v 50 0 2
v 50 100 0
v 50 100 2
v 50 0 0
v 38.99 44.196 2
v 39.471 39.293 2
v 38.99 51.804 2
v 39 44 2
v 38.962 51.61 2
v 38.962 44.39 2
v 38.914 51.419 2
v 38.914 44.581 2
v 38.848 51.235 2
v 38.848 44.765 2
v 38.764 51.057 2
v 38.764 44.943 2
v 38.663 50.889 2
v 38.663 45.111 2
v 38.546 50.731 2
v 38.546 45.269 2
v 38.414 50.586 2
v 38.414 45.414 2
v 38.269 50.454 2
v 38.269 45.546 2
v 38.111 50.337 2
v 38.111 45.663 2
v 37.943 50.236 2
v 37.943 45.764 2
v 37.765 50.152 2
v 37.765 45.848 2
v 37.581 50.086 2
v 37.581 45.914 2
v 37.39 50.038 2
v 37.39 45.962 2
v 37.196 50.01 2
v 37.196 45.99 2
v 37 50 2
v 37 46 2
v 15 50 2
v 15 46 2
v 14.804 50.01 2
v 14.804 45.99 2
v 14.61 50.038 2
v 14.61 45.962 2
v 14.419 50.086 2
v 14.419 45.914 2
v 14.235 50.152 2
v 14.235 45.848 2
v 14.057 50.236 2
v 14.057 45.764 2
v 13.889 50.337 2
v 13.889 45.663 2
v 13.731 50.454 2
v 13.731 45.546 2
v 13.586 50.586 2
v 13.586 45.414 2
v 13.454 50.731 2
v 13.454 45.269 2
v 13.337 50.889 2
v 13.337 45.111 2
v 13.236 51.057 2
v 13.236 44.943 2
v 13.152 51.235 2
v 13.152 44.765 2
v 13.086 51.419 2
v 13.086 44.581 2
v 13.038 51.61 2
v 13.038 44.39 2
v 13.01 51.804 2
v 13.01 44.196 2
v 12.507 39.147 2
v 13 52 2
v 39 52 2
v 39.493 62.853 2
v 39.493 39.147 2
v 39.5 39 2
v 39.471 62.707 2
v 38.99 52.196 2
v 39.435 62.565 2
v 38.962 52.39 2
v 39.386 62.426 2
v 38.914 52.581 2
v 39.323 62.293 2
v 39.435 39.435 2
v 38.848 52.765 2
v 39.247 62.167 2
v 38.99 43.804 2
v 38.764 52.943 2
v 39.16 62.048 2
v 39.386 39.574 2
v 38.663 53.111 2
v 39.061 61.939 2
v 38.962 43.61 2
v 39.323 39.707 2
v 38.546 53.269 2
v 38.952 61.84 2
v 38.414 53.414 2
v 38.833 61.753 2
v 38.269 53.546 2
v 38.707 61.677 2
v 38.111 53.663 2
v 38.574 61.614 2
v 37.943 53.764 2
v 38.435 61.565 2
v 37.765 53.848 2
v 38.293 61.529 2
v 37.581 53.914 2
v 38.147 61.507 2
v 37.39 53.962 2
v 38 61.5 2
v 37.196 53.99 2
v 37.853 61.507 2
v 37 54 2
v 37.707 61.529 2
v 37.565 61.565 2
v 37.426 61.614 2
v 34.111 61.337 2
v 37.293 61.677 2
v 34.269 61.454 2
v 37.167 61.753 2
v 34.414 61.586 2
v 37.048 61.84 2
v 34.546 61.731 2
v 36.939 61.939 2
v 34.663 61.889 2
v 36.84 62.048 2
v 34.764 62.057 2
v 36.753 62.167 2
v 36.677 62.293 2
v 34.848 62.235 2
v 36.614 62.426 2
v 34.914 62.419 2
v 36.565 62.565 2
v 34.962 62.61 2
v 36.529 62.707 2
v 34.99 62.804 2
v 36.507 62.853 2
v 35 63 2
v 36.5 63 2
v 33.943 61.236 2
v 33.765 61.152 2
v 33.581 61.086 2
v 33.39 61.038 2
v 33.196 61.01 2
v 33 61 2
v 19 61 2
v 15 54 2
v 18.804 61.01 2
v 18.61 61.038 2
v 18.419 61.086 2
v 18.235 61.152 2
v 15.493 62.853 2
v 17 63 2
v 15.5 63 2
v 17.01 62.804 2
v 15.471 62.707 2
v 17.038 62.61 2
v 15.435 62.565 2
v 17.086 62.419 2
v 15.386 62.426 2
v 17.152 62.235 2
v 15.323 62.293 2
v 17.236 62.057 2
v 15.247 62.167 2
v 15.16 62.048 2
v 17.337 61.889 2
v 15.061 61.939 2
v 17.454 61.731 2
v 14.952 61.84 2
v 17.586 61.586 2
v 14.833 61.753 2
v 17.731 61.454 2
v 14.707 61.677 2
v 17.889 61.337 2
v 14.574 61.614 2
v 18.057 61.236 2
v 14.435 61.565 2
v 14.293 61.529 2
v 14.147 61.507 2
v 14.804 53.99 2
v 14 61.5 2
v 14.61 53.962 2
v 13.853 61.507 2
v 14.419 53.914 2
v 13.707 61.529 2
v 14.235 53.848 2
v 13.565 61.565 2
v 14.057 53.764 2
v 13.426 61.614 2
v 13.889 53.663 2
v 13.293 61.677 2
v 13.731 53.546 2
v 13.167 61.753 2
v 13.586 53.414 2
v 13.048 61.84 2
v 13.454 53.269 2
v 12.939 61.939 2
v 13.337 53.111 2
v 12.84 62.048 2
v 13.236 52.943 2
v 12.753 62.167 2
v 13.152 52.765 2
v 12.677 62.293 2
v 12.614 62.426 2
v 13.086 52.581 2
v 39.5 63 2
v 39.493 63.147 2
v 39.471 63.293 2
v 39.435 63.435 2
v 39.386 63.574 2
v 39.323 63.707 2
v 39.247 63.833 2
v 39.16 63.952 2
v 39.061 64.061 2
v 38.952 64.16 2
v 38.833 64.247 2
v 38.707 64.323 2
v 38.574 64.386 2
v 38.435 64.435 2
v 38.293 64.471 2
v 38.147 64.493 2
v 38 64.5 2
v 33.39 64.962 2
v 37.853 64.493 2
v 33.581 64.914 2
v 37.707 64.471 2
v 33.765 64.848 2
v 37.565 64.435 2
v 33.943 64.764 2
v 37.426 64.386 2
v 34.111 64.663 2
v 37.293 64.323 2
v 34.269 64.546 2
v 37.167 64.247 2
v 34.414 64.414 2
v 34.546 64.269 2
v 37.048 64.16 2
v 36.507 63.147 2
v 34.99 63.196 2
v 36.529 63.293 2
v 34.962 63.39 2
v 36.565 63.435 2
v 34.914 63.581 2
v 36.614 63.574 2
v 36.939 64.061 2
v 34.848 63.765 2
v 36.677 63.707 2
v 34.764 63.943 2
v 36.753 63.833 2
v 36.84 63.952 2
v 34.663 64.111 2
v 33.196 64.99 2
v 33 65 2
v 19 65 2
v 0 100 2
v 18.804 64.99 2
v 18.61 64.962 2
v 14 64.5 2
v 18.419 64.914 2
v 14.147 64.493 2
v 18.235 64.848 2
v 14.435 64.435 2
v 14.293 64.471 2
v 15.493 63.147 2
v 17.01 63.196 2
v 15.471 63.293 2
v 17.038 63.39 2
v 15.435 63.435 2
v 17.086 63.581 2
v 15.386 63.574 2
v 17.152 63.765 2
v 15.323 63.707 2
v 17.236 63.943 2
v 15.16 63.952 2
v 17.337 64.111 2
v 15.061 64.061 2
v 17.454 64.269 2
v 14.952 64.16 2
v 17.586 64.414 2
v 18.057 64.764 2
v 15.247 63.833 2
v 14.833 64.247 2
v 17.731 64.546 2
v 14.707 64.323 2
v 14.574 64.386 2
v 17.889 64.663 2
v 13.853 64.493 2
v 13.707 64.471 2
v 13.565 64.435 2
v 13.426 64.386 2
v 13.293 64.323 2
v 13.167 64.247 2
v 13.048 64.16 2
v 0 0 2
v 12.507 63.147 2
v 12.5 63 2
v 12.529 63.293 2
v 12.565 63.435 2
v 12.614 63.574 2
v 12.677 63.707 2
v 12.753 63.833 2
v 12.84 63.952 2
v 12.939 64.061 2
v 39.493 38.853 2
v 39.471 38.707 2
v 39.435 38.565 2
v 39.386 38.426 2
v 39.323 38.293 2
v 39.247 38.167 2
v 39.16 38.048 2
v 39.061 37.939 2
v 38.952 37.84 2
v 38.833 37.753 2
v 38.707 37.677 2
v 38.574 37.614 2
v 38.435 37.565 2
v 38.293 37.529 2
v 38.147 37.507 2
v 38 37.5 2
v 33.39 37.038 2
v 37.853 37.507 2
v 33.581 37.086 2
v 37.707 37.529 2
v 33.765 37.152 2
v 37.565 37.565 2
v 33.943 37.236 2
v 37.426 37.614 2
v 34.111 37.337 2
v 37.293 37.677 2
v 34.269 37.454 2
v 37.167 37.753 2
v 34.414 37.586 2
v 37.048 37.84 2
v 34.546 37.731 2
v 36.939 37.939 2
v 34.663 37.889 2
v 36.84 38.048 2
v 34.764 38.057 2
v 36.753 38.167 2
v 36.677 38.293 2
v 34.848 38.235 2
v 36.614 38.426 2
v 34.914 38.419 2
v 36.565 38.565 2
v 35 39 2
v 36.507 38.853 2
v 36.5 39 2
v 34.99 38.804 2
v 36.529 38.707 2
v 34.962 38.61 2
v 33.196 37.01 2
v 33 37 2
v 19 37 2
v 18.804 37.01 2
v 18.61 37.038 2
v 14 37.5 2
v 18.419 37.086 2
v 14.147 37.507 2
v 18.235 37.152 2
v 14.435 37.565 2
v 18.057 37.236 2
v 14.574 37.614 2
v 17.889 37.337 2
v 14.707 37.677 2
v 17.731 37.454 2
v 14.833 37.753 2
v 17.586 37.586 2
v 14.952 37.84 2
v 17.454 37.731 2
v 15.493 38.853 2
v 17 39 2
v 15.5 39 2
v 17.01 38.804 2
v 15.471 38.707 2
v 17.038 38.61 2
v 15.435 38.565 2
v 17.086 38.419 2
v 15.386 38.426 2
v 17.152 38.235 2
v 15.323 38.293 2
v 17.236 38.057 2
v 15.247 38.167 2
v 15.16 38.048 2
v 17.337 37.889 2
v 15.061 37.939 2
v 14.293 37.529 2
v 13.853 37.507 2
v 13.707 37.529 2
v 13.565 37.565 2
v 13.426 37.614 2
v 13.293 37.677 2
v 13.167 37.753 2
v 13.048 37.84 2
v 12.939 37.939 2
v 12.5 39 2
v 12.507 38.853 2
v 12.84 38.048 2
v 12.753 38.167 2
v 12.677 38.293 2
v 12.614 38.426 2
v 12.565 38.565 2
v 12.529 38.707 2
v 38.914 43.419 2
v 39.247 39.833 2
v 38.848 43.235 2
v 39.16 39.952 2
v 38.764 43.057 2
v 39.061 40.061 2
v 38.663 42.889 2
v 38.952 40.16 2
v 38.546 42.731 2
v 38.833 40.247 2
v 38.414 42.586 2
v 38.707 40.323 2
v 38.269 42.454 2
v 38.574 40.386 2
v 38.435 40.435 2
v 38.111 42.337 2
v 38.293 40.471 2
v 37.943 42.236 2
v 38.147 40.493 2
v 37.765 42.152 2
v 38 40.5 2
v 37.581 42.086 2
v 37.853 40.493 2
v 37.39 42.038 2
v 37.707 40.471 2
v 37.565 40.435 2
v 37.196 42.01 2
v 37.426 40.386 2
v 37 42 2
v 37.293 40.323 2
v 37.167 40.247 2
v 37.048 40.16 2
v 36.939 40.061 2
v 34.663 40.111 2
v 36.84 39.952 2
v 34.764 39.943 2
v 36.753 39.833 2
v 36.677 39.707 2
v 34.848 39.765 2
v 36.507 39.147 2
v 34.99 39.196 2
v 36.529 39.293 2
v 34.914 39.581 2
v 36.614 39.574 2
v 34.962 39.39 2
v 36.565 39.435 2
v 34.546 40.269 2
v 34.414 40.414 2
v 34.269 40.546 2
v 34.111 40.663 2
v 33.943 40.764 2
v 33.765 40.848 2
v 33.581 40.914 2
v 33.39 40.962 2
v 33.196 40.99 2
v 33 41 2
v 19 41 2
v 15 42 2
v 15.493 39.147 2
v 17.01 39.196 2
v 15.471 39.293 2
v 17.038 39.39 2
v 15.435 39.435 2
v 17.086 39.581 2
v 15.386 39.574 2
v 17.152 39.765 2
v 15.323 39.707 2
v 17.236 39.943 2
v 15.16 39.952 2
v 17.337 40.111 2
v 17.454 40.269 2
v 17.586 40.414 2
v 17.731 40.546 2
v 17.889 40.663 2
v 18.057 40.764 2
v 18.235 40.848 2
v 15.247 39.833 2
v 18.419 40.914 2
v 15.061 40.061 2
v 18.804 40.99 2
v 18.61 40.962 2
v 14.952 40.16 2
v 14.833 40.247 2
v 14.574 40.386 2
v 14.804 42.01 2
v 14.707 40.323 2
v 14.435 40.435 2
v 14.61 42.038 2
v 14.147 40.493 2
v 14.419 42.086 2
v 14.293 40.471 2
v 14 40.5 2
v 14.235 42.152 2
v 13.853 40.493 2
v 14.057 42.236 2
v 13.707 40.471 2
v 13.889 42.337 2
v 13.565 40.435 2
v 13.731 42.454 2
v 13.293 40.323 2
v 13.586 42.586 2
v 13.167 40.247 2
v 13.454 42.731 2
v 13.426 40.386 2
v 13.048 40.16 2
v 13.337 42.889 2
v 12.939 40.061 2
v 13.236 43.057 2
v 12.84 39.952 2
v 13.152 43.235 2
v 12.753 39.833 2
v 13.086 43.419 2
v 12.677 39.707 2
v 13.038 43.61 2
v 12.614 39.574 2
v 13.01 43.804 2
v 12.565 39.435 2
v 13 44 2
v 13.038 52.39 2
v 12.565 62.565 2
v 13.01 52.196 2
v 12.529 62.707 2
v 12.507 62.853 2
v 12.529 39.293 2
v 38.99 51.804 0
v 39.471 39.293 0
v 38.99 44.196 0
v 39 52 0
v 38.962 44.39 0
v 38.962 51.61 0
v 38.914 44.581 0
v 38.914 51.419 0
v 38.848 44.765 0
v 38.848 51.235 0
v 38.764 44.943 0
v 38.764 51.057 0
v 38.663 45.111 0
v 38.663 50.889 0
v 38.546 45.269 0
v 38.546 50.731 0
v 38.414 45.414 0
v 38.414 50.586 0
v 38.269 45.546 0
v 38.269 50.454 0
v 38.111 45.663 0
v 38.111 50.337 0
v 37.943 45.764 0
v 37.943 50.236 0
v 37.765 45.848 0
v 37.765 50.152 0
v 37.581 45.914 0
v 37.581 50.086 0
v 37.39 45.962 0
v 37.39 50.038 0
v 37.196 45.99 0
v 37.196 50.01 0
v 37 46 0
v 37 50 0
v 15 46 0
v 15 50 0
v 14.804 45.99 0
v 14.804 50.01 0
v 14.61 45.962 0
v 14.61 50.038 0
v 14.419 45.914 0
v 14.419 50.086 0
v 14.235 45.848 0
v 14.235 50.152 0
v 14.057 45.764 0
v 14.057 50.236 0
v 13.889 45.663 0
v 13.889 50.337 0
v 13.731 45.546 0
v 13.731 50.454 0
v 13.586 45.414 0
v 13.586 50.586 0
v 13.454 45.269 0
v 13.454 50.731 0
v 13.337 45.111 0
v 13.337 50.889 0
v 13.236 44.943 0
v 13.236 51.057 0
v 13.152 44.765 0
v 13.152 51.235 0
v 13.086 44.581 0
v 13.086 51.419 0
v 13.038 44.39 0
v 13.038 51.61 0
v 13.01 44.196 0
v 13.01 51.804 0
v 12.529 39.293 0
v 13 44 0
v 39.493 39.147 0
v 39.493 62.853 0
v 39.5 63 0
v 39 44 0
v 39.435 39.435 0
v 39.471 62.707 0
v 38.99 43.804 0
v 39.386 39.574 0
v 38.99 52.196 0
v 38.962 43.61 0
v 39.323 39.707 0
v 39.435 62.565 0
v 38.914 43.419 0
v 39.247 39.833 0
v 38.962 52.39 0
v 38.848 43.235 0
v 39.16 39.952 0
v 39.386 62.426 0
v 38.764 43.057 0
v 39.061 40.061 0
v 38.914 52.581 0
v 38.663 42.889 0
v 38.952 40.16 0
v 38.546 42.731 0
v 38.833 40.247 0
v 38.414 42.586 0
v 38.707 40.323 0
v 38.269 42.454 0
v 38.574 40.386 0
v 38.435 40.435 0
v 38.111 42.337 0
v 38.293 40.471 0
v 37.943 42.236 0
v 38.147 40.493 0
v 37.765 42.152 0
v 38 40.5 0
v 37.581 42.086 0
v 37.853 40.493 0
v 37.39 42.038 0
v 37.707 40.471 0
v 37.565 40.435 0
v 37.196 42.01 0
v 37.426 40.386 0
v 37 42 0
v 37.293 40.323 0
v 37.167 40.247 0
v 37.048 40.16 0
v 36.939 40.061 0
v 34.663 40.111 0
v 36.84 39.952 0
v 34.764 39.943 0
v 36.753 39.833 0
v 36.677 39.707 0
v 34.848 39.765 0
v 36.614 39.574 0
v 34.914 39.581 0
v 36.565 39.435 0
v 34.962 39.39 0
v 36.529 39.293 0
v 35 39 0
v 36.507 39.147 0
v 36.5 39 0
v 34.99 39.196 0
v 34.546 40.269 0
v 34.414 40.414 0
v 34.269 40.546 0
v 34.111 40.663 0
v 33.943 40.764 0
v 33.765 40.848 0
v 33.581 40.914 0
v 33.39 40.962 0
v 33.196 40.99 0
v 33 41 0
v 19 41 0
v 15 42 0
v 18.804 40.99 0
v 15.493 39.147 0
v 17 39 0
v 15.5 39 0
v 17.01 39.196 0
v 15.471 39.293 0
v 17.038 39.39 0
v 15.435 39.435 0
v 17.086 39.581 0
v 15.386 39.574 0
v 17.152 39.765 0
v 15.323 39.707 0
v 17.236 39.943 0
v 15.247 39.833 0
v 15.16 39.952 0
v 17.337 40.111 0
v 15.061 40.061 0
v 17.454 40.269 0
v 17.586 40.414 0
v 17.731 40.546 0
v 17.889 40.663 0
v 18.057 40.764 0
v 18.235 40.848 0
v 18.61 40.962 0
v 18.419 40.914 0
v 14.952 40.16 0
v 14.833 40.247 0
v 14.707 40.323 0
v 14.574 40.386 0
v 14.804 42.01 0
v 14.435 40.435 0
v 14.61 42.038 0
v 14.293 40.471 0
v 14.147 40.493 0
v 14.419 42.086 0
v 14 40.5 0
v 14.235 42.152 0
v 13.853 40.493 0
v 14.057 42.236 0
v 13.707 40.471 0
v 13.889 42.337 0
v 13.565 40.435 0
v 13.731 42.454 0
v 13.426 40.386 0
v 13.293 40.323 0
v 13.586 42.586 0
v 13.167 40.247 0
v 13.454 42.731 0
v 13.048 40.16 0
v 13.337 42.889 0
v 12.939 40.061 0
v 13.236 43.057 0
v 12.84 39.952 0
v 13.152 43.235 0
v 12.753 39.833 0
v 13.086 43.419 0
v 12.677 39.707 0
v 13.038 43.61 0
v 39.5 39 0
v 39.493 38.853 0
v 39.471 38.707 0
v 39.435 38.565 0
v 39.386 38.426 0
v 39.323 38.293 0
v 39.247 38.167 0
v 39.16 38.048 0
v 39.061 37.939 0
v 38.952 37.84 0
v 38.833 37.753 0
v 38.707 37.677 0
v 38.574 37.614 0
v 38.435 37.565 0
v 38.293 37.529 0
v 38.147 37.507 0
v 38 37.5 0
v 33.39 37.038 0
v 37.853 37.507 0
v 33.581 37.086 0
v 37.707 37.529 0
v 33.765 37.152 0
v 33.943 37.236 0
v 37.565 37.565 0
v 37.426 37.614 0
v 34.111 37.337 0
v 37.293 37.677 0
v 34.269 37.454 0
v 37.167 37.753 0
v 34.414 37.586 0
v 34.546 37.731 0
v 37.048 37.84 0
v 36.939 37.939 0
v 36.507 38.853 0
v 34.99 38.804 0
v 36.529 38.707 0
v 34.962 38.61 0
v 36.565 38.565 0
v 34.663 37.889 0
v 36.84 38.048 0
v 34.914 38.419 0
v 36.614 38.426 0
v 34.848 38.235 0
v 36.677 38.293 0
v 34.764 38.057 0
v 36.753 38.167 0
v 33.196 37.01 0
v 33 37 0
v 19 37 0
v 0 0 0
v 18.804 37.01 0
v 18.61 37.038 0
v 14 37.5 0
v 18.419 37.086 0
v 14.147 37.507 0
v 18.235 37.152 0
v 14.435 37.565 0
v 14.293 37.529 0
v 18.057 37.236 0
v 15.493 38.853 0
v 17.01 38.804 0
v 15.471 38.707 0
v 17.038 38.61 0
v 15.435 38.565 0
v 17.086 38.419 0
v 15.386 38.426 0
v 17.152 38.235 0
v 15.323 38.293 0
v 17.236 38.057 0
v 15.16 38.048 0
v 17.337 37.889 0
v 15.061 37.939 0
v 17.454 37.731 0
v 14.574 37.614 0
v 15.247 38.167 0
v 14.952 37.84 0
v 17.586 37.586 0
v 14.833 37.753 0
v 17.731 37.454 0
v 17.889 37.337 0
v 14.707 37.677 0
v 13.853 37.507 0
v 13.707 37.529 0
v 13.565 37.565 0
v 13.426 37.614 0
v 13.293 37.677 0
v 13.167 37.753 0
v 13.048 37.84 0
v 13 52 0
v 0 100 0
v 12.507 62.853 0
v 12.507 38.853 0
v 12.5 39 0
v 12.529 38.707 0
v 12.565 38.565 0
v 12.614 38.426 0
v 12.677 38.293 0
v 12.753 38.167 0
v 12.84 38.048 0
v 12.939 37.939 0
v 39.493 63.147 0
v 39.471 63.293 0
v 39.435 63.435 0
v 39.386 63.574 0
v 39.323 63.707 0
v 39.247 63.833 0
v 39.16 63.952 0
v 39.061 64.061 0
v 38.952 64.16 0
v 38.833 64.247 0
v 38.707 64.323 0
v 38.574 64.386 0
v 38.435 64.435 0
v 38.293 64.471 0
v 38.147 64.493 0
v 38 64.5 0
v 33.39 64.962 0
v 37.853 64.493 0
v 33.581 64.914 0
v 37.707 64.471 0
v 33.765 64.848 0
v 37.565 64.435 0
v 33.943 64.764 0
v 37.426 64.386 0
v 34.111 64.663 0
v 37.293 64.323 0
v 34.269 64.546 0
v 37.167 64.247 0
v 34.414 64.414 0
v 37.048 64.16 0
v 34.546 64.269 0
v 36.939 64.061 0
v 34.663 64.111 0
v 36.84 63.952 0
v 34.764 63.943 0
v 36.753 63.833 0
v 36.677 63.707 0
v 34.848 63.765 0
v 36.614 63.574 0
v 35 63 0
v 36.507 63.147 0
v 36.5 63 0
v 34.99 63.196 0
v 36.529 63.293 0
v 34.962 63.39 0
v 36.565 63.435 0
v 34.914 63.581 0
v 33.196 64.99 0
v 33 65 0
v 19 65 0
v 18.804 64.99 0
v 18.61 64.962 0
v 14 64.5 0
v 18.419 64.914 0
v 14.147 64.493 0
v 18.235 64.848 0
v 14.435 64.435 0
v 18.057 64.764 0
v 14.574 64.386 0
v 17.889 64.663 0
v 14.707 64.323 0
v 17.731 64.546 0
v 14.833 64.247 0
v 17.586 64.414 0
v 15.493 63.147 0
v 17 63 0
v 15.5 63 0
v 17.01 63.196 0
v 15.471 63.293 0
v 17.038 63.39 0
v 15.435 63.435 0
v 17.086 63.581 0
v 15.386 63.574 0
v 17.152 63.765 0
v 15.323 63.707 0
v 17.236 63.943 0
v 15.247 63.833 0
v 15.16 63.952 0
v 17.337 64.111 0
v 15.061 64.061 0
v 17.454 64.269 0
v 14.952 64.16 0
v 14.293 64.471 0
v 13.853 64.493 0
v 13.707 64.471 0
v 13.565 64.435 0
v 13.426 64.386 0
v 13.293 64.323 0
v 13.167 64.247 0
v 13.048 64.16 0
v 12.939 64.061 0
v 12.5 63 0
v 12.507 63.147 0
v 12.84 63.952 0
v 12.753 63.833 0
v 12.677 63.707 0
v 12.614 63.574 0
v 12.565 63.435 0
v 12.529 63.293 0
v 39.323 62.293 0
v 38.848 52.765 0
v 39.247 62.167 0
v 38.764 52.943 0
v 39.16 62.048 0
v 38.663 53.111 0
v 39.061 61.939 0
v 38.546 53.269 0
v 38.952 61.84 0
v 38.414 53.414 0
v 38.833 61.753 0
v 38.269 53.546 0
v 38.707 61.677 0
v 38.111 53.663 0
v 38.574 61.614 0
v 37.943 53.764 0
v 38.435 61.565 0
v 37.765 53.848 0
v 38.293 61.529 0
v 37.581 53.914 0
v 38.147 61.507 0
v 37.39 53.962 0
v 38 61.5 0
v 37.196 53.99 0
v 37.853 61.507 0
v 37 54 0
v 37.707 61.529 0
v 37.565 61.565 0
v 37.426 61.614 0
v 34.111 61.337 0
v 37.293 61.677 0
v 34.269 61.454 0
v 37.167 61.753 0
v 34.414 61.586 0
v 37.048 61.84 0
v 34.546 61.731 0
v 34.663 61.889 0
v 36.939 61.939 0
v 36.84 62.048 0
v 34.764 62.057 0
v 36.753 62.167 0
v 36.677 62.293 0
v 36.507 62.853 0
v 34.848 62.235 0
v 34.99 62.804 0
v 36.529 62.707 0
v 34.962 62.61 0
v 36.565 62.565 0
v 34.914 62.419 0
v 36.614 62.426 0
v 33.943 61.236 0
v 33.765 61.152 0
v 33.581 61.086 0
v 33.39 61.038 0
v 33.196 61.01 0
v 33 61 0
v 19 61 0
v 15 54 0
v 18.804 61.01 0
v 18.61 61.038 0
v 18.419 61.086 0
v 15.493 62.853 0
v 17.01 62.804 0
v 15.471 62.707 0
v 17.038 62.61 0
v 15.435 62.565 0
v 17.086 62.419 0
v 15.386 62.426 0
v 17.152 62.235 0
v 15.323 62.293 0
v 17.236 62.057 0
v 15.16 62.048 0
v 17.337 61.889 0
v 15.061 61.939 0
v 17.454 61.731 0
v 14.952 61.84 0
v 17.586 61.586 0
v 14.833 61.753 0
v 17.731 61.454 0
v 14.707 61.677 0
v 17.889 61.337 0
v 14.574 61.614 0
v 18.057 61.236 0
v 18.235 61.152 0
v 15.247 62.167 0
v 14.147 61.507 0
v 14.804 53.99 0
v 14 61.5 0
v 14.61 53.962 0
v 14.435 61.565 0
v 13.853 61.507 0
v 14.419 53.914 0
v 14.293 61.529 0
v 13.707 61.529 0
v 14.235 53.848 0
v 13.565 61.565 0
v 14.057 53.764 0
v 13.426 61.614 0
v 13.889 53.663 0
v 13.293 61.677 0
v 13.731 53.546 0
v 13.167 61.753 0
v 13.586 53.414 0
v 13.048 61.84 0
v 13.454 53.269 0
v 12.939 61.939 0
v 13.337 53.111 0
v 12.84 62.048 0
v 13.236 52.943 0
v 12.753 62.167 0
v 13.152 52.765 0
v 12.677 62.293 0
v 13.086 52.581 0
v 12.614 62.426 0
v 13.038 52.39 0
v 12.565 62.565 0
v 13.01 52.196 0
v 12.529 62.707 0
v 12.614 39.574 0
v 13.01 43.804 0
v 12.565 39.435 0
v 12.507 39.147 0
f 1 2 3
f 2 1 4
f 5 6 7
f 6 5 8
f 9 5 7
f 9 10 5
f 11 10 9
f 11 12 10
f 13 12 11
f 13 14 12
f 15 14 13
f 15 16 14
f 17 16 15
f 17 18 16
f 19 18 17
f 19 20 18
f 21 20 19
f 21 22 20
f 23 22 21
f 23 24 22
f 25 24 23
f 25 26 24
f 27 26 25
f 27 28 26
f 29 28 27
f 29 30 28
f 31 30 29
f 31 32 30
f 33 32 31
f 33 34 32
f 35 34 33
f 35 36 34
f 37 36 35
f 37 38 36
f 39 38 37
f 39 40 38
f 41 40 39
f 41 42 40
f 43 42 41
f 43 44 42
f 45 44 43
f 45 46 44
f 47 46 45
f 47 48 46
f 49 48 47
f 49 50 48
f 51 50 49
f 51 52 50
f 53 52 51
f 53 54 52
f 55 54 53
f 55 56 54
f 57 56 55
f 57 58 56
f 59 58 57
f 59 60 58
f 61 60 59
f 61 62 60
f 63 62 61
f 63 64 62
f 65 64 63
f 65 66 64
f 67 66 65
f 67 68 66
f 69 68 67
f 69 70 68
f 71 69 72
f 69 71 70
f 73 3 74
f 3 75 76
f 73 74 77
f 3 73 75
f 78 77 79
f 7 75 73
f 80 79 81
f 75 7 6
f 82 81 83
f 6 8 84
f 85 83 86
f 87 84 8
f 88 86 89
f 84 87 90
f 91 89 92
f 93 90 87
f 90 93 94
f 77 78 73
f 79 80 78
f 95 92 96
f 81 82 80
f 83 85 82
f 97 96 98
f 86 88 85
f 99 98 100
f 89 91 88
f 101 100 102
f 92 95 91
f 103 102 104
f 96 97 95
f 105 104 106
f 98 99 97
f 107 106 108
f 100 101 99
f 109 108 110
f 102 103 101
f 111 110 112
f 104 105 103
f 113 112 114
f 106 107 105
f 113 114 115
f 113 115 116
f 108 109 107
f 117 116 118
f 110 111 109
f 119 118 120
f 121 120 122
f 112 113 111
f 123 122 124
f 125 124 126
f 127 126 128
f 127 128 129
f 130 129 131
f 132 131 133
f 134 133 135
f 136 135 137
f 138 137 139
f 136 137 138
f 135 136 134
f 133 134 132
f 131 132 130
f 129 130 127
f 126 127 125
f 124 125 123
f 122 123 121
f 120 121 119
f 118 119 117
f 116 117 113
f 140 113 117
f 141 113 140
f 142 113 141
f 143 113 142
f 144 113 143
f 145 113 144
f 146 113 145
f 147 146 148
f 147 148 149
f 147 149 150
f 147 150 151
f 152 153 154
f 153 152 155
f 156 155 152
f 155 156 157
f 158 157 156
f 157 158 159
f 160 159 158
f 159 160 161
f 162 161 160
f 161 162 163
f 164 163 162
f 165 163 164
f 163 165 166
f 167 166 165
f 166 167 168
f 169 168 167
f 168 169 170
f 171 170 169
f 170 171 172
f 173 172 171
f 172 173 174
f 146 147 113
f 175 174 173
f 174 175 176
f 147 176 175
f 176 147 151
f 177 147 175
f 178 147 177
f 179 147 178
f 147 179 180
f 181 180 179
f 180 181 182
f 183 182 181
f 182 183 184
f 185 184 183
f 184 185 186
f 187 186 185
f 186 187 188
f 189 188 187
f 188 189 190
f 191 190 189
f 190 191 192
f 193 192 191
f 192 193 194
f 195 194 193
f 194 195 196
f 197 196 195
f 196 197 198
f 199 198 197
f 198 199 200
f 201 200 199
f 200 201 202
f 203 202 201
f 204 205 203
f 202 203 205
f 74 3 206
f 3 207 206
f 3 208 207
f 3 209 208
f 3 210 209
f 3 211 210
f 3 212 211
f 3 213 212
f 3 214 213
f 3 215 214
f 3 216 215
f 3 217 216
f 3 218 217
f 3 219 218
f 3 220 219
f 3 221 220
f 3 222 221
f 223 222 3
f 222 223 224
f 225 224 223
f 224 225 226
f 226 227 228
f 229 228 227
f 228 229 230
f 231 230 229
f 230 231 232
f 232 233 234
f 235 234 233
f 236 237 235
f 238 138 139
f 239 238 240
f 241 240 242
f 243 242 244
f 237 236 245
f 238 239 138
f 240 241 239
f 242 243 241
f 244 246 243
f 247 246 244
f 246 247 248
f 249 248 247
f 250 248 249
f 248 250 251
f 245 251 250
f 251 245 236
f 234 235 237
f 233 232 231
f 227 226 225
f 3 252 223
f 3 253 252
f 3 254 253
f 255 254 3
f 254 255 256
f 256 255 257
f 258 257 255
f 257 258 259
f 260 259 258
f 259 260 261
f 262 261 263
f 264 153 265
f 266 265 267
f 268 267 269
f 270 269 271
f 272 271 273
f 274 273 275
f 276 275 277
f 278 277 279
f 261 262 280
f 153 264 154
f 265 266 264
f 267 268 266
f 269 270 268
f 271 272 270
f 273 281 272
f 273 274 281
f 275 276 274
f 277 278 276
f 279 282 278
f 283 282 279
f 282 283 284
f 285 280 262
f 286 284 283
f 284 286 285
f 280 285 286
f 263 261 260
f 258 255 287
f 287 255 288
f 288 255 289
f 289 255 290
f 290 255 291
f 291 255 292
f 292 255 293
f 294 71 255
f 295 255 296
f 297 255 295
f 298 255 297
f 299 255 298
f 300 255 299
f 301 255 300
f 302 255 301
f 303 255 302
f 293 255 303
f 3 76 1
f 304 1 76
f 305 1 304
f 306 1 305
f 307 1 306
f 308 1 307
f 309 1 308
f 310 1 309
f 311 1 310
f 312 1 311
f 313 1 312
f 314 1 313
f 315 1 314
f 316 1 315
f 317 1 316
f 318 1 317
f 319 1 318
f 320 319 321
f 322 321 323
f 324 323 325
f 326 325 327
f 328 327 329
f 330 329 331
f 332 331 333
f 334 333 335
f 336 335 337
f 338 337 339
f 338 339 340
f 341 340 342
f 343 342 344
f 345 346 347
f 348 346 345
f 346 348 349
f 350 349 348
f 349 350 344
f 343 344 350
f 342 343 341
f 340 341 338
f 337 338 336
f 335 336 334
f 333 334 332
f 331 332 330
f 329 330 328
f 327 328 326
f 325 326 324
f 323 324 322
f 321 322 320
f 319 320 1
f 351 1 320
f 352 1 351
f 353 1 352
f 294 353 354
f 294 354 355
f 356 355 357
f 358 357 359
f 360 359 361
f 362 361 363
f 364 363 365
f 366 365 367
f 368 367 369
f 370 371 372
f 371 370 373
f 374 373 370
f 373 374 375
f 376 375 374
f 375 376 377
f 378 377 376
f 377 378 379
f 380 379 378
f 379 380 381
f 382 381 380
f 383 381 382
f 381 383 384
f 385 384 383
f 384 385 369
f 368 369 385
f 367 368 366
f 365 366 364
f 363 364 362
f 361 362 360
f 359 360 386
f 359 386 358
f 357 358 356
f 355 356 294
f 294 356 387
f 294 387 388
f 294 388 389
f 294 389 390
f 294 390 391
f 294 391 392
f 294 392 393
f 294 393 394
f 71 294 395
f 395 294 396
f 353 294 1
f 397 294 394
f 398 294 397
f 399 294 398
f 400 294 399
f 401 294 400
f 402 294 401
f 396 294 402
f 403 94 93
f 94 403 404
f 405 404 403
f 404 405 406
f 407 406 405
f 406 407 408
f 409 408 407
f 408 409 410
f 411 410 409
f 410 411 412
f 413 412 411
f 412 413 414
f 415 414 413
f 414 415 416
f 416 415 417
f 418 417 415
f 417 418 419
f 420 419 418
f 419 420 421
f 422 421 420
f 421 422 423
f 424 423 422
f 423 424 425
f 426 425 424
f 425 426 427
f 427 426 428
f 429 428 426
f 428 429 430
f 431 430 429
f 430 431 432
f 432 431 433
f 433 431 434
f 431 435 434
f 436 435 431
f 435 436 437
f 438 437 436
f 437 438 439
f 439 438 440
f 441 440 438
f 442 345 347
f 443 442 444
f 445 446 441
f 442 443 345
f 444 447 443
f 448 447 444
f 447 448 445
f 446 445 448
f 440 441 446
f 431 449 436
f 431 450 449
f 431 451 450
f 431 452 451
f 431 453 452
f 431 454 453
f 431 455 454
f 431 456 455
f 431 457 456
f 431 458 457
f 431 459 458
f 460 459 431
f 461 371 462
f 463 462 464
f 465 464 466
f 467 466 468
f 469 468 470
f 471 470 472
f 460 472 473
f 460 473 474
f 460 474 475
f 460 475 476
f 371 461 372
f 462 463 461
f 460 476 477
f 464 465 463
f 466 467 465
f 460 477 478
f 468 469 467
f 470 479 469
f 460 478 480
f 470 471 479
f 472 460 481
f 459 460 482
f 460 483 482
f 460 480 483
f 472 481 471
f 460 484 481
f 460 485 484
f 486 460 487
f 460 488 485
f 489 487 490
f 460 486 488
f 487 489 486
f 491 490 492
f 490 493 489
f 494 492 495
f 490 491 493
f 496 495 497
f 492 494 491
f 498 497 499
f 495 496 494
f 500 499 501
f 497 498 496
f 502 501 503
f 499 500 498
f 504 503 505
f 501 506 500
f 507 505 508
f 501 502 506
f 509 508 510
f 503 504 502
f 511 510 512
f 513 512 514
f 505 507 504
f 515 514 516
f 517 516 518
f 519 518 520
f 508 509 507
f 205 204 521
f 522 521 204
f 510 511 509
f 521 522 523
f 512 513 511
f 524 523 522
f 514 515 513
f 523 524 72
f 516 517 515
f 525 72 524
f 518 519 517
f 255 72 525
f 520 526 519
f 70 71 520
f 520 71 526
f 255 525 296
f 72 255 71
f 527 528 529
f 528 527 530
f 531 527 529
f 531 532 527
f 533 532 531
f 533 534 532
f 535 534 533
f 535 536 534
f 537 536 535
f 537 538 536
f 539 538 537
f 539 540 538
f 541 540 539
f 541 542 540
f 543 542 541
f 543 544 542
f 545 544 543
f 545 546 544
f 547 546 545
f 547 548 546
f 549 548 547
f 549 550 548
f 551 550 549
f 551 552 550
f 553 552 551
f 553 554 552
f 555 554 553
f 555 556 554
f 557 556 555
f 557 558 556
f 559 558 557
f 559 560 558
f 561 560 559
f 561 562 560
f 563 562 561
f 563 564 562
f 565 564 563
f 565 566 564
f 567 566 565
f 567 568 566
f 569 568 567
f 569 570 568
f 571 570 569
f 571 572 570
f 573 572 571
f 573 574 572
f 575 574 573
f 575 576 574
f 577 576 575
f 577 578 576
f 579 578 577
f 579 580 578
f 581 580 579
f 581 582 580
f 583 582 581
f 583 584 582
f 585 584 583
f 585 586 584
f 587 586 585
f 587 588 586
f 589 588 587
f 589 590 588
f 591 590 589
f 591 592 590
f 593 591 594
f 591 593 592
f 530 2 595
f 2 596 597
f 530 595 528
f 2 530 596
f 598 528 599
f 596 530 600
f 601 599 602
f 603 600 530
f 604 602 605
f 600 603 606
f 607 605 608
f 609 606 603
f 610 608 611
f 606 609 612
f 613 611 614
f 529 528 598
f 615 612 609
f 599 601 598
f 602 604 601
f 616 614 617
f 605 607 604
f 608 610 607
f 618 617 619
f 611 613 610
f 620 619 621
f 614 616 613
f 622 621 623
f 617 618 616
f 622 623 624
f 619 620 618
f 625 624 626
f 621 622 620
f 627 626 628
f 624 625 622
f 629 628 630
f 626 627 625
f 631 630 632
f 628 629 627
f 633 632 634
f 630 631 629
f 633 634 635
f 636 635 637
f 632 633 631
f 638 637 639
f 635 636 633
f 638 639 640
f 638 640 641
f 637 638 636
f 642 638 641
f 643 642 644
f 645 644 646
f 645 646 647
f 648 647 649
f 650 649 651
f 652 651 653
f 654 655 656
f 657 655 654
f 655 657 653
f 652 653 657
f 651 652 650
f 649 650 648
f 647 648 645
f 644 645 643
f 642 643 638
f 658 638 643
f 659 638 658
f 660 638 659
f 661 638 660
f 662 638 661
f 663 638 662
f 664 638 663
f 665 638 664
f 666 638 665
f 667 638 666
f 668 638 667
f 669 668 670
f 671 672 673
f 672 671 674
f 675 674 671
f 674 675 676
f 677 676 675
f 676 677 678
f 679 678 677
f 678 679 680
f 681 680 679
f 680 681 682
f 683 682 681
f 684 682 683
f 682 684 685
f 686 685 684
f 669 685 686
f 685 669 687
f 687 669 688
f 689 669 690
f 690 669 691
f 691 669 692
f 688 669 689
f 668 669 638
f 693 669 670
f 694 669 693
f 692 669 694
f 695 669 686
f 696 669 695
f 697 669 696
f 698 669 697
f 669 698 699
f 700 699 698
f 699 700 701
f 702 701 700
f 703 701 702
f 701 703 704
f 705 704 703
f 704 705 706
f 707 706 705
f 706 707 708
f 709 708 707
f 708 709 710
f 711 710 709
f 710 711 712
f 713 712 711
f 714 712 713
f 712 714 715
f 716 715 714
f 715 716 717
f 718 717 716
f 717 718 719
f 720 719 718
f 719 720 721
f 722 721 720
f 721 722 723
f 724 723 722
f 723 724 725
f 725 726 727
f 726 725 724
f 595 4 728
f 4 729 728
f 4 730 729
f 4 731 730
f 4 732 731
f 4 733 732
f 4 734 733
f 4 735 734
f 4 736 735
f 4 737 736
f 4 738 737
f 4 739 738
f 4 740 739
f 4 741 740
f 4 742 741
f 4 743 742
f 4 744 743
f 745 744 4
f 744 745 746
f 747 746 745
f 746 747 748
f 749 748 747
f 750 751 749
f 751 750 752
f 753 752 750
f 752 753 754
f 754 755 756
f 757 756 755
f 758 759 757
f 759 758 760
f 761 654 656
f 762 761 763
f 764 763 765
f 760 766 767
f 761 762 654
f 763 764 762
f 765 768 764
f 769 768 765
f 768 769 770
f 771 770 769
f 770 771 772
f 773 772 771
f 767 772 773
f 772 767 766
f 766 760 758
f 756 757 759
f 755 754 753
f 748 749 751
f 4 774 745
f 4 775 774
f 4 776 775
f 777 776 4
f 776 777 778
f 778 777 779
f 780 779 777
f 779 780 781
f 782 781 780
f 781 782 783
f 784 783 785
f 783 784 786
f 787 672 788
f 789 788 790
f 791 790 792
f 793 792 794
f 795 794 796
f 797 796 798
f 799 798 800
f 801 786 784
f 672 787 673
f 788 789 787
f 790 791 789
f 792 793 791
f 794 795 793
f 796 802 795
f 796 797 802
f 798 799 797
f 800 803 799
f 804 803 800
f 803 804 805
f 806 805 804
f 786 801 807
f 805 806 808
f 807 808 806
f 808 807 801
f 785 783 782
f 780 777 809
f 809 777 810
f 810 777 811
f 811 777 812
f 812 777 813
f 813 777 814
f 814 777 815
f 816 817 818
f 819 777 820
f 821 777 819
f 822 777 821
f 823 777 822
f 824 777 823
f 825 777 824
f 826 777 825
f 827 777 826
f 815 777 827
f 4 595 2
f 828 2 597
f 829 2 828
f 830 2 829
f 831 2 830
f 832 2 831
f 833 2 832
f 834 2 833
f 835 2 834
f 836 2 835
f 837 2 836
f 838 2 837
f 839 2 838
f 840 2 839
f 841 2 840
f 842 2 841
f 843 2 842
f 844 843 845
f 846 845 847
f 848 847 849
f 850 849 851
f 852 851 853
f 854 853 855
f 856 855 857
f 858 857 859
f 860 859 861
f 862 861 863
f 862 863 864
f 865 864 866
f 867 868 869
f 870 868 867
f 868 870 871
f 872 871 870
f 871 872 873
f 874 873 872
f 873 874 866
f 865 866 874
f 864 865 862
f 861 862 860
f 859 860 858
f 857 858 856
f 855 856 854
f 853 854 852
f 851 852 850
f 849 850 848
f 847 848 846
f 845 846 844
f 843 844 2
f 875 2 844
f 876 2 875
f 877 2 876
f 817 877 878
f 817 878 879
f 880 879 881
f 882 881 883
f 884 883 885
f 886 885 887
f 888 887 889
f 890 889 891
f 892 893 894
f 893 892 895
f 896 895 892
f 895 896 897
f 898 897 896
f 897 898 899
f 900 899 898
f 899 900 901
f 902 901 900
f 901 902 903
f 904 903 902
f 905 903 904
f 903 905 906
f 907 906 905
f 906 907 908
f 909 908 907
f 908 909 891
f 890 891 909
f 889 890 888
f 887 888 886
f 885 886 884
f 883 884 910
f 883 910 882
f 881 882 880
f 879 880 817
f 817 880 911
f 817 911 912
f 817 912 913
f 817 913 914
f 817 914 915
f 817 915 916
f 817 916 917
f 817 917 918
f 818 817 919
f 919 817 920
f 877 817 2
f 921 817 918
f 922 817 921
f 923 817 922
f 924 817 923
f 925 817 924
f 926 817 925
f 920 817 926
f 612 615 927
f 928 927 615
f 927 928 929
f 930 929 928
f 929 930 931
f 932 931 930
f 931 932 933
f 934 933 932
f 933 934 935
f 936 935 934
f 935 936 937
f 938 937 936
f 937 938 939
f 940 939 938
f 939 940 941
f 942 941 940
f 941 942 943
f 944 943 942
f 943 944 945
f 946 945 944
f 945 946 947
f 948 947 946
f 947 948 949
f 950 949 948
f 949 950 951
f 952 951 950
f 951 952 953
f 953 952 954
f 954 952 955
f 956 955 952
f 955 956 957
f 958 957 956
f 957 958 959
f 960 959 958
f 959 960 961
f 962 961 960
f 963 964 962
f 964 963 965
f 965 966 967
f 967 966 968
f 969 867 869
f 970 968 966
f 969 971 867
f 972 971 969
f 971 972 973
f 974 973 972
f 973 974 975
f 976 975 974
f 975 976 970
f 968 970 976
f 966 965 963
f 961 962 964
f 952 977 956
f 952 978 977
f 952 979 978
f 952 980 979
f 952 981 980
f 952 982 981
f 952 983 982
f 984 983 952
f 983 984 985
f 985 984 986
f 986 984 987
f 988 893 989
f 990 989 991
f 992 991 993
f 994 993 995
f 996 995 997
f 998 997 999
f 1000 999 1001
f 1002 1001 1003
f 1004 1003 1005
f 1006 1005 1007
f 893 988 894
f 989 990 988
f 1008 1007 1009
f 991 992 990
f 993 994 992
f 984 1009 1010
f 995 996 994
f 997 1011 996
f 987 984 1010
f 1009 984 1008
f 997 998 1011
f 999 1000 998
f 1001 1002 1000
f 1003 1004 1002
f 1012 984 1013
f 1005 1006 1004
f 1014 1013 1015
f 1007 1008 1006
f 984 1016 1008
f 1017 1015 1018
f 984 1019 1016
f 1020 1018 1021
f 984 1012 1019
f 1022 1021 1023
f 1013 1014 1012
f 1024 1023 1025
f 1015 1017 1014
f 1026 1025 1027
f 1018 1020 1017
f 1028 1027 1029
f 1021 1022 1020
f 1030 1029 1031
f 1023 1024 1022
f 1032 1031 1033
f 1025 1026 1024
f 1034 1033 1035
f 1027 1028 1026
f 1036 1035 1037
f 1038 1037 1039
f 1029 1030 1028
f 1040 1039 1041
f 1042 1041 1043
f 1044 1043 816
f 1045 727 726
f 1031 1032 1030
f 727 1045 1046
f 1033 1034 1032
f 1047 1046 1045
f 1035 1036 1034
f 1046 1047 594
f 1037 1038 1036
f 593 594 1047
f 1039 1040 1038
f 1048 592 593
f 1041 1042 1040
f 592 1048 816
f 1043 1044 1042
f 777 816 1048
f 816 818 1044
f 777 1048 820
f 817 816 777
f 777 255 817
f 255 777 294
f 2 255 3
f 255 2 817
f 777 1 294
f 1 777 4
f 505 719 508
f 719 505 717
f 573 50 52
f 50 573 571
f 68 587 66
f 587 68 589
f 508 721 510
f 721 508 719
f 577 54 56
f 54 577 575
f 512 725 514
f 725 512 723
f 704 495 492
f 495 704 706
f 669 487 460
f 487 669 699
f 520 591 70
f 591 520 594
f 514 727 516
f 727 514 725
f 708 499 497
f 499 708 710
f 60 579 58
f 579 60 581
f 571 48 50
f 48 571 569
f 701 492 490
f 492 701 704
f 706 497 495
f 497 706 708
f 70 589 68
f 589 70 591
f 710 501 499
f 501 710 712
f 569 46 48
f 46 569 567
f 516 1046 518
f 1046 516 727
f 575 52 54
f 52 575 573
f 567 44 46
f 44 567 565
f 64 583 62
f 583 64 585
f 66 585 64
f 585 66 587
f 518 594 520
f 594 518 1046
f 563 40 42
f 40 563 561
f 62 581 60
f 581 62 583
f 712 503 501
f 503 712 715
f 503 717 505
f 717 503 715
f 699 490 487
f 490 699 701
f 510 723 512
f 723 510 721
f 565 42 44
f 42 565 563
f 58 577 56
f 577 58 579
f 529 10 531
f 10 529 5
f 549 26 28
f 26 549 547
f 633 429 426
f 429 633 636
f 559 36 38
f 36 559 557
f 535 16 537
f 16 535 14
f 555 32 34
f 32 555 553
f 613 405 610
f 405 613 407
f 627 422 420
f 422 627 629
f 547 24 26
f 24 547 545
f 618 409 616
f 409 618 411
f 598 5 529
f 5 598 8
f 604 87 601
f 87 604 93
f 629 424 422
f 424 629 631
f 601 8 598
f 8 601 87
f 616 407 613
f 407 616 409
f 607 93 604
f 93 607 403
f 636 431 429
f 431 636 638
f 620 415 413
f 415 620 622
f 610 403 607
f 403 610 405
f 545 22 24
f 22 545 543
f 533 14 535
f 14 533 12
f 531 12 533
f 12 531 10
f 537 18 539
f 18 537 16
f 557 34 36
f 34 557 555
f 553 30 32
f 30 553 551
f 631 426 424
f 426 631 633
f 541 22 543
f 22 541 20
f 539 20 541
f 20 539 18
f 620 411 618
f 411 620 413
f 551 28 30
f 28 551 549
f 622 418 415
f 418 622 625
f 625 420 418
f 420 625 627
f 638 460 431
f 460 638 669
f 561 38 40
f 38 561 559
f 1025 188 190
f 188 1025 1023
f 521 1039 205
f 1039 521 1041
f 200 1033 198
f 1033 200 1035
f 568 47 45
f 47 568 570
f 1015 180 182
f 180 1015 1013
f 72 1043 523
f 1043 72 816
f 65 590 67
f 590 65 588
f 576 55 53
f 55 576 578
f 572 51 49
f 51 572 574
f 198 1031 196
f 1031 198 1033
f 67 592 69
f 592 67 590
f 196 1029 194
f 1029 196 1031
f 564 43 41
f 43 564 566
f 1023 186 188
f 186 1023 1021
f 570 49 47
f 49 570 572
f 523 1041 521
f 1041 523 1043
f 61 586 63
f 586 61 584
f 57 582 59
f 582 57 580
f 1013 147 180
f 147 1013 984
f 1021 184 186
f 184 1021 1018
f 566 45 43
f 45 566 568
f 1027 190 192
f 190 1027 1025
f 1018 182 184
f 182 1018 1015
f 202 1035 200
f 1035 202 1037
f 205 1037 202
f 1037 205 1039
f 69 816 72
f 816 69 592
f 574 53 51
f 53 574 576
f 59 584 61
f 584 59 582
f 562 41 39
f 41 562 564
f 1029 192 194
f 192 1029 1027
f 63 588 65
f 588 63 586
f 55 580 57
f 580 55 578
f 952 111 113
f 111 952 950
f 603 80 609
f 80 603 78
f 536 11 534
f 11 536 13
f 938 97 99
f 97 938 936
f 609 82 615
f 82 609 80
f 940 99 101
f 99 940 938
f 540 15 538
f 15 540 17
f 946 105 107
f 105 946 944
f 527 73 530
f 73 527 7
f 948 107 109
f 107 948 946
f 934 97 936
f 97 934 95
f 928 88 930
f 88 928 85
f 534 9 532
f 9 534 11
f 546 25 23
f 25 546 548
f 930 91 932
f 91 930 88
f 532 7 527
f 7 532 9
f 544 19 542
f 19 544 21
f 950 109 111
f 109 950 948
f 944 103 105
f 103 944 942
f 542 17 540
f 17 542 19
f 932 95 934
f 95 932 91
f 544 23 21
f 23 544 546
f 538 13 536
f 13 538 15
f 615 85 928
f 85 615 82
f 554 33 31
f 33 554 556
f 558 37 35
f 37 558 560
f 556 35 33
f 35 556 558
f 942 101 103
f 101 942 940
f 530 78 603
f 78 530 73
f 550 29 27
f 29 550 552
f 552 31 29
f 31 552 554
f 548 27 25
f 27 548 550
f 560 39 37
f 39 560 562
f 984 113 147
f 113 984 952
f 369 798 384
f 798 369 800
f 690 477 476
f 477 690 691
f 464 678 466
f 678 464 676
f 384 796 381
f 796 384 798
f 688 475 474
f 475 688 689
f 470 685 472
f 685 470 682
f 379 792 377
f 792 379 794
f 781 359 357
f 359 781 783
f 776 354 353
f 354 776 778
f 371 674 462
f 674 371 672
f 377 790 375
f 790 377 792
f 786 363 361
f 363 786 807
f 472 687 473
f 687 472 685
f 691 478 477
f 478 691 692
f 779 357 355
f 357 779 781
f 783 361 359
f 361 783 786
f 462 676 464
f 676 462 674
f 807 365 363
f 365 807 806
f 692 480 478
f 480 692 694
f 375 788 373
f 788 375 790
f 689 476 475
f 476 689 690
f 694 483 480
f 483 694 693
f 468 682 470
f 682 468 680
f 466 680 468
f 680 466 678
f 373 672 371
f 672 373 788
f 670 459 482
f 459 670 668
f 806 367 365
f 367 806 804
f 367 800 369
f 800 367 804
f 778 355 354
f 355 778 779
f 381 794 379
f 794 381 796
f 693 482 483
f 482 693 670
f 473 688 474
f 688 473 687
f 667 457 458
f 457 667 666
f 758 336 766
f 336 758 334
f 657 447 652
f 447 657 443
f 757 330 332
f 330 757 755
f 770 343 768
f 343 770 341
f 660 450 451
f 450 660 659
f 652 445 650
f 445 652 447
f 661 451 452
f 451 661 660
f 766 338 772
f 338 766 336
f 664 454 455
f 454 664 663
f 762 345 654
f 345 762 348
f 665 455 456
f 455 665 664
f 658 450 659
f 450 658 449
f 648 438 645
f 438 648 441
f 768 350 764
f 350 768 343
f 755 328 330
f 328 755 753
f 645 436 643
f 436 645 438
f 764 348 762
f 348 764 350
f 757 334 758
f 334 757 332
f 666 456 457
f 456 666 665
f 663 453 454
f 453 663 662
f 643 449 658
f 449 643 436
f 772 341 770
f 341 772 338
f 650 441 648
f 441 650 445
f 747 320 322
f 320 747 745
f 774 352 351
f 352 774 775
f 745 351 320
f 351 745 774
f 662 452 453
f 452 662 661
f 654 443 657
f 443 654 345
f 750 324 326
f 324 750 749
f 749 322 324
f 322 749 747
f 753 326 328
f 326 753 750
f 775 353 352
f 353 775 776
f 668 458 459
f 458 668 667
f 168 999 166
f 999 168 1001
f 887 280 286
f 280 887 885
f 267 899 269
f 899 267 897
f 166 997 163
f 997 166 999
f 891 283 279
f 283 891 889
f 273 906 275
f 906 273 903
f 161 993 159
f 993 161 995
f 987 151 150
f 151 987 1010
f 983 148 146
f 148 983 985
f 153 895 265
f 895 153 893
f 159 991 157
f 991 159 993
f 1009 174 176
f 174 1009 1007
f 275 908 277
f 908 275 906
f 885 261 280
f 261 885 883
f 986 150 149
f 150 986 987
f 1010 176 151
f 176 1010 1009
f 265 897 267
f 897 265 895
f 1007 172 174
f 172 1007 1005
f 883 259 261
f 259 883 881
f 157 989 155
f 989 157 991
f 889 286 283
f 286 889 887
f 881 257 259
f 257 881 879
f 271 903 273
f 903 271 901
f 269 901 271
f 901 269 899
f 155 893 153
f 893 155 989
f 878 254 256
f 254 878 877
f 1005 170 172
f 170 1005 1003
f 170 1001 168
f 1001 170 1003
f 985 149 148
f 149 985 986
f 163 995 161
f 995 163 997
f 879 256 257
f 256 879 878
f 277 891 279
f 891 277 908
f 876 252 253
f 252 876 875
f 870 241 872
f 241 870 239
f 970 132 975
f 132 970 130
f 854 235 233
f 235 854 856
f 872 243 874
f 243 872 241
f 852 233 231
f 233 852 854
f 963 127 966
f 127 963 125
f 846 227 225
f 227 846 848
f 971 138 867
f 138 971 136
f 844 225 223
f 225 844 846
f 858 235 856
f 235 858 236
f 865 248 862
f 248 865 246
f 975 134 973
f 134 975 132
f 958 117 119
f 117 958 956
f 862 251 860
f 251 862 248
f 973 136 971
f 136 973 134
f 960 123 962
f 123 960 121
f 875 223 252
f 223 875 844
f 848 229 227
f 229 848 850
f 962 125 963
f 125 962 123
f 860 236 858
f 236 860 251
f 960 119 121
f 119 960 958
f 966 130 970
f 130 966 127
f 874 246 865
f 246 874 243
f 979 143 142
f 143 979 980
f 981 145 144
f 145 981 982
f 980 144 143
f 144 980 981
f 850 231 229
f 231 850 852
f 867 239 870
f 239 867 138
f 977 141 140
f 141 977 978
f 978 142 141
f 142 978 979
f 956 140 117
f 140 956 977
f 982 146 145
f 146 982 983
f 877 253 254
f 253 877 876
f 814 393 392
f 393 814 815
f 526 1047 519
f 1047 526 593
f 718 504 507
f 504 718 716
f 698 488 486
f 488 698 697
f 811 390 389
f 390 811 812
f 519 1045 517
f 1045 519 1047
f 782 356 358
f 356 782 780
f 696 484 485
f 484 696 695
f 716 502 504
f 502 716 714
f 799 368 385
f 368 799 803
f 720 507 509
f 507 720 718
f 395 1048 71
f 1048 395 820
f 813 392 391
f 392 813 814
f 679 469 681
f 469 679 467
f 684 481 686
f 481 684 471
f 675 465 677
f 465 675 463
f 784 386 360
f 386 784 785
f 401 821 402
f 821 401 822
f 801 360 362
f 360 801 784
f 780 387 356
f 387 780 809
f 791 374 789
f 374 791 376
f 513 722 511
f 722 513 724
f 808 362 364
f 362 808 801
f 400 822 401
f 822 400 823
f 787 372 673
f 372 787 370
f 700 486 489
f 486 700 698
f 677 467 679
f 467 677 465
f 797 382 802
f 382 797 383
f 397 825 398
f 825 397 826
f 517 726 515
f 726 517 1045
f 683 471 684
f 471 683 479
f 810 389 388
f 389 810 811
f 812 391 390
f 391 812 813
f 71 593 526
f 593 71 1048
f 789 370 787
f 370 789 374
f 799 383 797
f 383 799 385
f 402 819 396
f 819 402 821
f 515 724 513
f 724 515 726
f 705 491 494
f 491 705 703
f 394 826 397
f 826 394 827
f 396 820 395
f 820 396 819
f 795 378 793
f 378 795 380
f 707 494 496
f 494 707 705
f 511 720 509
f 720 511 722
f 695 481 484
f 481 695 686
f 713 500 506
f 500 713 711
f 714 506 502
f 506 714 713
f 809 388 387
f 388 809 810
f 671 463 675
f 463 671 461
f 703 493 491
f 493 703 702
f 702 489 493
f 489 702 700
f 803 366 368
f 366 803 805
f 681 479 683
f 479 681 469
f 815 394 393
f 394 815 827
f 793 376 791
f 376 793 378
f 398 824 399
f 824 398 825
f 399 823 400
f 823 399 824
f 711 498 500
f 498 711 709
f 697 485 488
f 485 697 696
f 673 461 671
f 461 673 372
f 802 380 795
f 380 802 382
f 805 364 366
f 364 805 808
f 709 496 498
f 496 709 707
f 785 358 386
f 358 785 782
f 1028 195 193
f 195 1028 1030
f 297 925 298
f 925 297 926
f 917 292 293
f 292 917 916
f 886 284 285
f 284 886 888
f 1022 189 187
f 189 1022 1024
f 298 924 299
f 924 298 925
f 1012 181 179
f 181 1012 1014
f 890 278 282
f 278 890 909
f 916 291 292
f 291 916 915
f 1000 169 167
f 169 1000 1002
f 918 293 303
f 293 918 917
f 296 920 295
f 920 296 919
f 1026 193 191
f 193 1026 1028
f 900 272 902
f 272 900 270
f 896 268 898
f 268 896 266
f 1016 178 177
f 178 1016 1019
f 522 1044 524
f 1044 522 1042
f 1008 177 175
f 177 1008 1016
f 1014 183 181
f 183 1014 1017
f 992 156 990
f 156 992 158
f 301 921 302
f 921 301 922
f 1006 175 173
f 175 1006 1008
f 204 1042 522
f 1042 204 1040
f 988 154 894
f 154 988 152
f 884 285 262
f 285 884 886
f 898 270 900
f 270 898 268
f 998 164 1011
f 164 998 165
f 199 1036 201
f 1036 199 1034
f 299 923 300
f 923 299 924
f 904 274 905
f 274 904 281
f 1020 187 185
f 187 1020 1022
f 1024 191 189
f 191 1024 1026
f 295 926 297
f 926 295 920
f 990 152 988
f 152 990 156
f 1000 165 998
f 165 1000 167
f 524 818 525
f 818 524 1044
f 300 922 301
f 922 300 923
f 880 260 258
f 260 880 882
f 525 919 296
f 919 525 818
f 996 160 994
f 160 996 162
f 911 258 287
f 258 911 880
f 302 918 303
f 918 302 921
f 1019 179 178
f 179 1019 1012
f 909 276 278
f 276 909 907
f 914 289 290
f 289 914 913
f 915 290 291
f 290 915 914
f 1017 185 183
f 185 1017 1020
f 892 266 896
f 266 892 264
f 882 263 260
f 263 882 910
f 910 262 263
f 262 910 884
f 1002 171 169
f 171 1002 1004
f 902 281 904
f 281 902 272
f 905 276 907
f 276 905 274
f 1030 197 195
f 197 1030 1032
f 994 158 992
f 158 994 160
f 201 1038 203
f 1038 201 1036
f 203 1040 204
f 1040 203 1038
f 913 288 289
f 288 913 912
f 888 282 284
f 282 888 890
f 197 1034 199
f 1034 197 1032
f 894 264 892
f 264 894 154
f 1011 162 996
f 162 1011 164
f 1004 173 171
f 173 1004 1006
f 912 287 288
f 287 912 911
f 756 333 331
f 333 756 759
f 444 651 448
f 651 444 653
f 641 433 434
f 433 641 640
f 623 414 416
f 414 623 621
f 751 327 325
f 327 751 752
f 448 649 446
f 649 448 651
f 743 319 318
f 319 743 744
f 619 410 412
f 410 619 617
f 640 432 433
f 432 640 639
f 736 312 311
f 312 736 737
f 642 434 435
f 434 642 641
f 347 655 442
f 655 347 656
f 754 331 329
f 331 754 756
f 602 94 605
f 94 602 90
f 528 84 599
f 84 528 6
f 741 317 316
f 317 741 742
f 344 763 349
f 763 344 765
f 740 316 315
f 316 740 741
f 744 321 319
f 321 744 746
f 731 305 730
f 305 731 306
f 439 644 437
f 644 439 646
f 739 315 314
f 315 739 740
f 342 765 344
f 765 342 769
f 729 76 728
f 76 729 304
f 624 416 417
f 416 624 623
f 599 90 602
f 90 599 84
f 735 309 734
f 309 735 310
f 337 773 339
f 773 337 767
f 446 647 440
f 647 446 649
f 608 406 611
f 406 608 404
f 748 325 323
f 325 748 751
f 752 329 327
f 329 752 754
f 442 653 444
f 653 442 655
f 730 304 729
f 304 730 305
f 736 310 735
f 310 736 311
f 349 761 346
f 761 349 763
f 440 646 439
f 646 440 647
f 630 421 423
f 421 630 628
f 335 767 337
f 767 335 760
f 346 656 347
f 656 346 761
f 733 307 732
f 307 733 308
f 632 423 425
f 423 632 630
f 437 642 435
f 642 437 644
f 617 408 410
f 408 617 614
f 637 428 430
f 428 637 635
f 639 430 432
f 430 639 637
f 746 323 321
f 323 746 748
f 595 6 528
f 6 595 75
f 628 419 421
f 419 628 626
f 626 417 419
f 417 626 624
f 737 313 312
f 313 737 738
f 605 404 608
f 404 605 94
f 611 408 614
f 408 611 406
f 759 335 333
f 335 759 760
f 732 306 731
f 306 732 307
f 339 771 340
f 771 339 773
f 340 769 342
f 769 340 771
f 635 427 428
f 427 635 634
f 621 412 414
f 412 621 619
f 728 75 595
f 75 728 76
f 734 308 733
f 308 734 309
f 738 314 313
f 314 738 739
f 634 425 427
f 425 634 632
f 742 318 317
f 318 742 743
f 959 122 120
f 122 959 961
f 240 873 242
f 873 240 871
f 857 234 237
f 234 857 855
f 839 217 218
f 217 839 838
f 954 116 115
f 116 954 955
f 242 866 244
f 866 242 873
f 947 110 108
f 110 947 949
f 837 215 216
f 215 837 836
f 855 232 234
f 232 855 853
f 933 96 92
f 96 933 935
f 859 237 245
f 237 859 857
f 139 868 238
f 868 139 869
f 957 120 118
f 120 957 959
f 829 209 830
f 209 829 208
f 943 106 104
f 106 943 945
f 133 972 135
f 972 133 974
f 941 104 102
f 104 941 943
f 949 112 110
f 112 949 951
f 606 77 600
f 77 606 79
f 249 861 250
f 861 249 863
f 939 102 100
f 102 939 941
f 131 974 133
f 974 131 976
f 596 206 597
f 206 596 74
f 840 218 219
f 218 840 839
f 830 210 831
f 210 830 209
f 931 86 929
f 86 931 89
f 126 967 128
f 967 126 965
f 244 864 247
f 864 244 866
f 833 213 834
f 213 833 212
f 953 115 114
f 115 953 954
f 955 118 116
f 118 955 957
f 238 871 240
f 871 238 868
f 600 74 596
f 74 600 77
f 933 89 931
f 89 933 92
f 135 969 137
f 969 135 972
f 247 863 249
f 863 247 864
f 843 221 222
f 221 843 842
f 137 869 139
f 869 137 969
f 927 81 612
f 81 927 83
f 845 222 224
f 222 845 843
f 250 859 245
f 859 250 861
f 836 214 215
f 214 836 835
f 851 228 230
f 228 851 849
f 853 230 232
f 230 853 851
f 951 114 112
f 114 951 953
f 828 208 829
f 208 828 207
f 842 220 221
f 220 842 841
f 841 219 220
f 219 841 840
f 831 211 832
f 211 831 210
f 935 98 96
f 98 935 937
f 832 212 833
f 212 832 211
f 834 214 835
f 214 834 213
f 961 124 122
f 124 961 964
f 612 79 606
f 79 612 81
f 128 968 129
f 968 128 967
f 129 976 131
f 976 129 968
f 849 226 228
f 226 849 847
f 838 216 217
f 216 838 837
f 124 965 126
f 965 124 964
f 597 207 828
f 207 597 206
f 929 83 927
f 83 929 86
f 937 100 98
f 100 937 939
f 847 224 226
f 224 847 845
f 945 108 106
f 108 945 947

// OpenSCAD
difference(){difference(){difference(){difference(){difference(){difference(){difference(){difference(){difference(){difference(){difference(){difference(){difference(){difference(){difference(){difference(){translate([0, 0, 0])cube([50, 100,2]);translate([15.0, 44.0, 2.0])rotate([0, 180, 0])cylinder(r=2.0, h=2.0, $fn=64);translate([37.0, 44.0, 2.0])rotate([0, 180, 0])cylinder(r=2.0, h=2.0, $fn=64);translate([37.0, 42.0, 2.0])rotate([0, 180, 0])cube([22.0, 4.0,2.0]);translate([15.0, 52.0, 2.0])rotate([0, 180, 0])cylinder(r=2.0, h=2.0, $fn=64);translate([37.0, 52.0, 2.0])rotate([0, 180, 0])cylinder(r=2.0, h=2.0, $fn=64);translate([37.0, 50.0, 2.0])rotate([0, 180, 0])cube([22.0, 4.0,2.0]);translate([19.0, 39.0, 2.0])rotate([0, 180, 0])cylinder(r=2.0, h=2.0, $fn=64);translate([33.0, 39.0, 2.0])rotate([0, 180, 0])cylinder(r=2.0, h=2.0, $fn=64);translate([33.0, 37.0, 2.0])rotate([0, 180, 0])cube([14.0, 4,2.0]);translate([19.0, 63.0, 2.0])rotate([0, 180, 0])cylinder(r=2.0, h=2.0, $fn=64);translate([33.0, 63.0, 2.0])rotate([0, 180, 0])cylinder(r=2.0, h=2.0, $fn=64);translate([33.0, 61.0, 2.0])rotate([0, 180, 0])cube([14.0, 4,2.0]);translate([14.0, 39.0, 2.0])rotate([0, 180, 0])cylinder(r=1.5, h=2, $fn=64);translate([14.0, 63.0, 2.0])rotate([0, 180, 0])cylinder(r=1.5, h=2, $fn=64);translate([38.0, 39.0, 2.0])rotate([0, 180, 0])cylinder(r=1.5, h=2, $fn=64);translate([38.0, 63.0, 2.0])rotate([0, 180, 0])cylinder(r=1.5, h=2, $fn=64);}}}}}}}}}}}}}}}}
